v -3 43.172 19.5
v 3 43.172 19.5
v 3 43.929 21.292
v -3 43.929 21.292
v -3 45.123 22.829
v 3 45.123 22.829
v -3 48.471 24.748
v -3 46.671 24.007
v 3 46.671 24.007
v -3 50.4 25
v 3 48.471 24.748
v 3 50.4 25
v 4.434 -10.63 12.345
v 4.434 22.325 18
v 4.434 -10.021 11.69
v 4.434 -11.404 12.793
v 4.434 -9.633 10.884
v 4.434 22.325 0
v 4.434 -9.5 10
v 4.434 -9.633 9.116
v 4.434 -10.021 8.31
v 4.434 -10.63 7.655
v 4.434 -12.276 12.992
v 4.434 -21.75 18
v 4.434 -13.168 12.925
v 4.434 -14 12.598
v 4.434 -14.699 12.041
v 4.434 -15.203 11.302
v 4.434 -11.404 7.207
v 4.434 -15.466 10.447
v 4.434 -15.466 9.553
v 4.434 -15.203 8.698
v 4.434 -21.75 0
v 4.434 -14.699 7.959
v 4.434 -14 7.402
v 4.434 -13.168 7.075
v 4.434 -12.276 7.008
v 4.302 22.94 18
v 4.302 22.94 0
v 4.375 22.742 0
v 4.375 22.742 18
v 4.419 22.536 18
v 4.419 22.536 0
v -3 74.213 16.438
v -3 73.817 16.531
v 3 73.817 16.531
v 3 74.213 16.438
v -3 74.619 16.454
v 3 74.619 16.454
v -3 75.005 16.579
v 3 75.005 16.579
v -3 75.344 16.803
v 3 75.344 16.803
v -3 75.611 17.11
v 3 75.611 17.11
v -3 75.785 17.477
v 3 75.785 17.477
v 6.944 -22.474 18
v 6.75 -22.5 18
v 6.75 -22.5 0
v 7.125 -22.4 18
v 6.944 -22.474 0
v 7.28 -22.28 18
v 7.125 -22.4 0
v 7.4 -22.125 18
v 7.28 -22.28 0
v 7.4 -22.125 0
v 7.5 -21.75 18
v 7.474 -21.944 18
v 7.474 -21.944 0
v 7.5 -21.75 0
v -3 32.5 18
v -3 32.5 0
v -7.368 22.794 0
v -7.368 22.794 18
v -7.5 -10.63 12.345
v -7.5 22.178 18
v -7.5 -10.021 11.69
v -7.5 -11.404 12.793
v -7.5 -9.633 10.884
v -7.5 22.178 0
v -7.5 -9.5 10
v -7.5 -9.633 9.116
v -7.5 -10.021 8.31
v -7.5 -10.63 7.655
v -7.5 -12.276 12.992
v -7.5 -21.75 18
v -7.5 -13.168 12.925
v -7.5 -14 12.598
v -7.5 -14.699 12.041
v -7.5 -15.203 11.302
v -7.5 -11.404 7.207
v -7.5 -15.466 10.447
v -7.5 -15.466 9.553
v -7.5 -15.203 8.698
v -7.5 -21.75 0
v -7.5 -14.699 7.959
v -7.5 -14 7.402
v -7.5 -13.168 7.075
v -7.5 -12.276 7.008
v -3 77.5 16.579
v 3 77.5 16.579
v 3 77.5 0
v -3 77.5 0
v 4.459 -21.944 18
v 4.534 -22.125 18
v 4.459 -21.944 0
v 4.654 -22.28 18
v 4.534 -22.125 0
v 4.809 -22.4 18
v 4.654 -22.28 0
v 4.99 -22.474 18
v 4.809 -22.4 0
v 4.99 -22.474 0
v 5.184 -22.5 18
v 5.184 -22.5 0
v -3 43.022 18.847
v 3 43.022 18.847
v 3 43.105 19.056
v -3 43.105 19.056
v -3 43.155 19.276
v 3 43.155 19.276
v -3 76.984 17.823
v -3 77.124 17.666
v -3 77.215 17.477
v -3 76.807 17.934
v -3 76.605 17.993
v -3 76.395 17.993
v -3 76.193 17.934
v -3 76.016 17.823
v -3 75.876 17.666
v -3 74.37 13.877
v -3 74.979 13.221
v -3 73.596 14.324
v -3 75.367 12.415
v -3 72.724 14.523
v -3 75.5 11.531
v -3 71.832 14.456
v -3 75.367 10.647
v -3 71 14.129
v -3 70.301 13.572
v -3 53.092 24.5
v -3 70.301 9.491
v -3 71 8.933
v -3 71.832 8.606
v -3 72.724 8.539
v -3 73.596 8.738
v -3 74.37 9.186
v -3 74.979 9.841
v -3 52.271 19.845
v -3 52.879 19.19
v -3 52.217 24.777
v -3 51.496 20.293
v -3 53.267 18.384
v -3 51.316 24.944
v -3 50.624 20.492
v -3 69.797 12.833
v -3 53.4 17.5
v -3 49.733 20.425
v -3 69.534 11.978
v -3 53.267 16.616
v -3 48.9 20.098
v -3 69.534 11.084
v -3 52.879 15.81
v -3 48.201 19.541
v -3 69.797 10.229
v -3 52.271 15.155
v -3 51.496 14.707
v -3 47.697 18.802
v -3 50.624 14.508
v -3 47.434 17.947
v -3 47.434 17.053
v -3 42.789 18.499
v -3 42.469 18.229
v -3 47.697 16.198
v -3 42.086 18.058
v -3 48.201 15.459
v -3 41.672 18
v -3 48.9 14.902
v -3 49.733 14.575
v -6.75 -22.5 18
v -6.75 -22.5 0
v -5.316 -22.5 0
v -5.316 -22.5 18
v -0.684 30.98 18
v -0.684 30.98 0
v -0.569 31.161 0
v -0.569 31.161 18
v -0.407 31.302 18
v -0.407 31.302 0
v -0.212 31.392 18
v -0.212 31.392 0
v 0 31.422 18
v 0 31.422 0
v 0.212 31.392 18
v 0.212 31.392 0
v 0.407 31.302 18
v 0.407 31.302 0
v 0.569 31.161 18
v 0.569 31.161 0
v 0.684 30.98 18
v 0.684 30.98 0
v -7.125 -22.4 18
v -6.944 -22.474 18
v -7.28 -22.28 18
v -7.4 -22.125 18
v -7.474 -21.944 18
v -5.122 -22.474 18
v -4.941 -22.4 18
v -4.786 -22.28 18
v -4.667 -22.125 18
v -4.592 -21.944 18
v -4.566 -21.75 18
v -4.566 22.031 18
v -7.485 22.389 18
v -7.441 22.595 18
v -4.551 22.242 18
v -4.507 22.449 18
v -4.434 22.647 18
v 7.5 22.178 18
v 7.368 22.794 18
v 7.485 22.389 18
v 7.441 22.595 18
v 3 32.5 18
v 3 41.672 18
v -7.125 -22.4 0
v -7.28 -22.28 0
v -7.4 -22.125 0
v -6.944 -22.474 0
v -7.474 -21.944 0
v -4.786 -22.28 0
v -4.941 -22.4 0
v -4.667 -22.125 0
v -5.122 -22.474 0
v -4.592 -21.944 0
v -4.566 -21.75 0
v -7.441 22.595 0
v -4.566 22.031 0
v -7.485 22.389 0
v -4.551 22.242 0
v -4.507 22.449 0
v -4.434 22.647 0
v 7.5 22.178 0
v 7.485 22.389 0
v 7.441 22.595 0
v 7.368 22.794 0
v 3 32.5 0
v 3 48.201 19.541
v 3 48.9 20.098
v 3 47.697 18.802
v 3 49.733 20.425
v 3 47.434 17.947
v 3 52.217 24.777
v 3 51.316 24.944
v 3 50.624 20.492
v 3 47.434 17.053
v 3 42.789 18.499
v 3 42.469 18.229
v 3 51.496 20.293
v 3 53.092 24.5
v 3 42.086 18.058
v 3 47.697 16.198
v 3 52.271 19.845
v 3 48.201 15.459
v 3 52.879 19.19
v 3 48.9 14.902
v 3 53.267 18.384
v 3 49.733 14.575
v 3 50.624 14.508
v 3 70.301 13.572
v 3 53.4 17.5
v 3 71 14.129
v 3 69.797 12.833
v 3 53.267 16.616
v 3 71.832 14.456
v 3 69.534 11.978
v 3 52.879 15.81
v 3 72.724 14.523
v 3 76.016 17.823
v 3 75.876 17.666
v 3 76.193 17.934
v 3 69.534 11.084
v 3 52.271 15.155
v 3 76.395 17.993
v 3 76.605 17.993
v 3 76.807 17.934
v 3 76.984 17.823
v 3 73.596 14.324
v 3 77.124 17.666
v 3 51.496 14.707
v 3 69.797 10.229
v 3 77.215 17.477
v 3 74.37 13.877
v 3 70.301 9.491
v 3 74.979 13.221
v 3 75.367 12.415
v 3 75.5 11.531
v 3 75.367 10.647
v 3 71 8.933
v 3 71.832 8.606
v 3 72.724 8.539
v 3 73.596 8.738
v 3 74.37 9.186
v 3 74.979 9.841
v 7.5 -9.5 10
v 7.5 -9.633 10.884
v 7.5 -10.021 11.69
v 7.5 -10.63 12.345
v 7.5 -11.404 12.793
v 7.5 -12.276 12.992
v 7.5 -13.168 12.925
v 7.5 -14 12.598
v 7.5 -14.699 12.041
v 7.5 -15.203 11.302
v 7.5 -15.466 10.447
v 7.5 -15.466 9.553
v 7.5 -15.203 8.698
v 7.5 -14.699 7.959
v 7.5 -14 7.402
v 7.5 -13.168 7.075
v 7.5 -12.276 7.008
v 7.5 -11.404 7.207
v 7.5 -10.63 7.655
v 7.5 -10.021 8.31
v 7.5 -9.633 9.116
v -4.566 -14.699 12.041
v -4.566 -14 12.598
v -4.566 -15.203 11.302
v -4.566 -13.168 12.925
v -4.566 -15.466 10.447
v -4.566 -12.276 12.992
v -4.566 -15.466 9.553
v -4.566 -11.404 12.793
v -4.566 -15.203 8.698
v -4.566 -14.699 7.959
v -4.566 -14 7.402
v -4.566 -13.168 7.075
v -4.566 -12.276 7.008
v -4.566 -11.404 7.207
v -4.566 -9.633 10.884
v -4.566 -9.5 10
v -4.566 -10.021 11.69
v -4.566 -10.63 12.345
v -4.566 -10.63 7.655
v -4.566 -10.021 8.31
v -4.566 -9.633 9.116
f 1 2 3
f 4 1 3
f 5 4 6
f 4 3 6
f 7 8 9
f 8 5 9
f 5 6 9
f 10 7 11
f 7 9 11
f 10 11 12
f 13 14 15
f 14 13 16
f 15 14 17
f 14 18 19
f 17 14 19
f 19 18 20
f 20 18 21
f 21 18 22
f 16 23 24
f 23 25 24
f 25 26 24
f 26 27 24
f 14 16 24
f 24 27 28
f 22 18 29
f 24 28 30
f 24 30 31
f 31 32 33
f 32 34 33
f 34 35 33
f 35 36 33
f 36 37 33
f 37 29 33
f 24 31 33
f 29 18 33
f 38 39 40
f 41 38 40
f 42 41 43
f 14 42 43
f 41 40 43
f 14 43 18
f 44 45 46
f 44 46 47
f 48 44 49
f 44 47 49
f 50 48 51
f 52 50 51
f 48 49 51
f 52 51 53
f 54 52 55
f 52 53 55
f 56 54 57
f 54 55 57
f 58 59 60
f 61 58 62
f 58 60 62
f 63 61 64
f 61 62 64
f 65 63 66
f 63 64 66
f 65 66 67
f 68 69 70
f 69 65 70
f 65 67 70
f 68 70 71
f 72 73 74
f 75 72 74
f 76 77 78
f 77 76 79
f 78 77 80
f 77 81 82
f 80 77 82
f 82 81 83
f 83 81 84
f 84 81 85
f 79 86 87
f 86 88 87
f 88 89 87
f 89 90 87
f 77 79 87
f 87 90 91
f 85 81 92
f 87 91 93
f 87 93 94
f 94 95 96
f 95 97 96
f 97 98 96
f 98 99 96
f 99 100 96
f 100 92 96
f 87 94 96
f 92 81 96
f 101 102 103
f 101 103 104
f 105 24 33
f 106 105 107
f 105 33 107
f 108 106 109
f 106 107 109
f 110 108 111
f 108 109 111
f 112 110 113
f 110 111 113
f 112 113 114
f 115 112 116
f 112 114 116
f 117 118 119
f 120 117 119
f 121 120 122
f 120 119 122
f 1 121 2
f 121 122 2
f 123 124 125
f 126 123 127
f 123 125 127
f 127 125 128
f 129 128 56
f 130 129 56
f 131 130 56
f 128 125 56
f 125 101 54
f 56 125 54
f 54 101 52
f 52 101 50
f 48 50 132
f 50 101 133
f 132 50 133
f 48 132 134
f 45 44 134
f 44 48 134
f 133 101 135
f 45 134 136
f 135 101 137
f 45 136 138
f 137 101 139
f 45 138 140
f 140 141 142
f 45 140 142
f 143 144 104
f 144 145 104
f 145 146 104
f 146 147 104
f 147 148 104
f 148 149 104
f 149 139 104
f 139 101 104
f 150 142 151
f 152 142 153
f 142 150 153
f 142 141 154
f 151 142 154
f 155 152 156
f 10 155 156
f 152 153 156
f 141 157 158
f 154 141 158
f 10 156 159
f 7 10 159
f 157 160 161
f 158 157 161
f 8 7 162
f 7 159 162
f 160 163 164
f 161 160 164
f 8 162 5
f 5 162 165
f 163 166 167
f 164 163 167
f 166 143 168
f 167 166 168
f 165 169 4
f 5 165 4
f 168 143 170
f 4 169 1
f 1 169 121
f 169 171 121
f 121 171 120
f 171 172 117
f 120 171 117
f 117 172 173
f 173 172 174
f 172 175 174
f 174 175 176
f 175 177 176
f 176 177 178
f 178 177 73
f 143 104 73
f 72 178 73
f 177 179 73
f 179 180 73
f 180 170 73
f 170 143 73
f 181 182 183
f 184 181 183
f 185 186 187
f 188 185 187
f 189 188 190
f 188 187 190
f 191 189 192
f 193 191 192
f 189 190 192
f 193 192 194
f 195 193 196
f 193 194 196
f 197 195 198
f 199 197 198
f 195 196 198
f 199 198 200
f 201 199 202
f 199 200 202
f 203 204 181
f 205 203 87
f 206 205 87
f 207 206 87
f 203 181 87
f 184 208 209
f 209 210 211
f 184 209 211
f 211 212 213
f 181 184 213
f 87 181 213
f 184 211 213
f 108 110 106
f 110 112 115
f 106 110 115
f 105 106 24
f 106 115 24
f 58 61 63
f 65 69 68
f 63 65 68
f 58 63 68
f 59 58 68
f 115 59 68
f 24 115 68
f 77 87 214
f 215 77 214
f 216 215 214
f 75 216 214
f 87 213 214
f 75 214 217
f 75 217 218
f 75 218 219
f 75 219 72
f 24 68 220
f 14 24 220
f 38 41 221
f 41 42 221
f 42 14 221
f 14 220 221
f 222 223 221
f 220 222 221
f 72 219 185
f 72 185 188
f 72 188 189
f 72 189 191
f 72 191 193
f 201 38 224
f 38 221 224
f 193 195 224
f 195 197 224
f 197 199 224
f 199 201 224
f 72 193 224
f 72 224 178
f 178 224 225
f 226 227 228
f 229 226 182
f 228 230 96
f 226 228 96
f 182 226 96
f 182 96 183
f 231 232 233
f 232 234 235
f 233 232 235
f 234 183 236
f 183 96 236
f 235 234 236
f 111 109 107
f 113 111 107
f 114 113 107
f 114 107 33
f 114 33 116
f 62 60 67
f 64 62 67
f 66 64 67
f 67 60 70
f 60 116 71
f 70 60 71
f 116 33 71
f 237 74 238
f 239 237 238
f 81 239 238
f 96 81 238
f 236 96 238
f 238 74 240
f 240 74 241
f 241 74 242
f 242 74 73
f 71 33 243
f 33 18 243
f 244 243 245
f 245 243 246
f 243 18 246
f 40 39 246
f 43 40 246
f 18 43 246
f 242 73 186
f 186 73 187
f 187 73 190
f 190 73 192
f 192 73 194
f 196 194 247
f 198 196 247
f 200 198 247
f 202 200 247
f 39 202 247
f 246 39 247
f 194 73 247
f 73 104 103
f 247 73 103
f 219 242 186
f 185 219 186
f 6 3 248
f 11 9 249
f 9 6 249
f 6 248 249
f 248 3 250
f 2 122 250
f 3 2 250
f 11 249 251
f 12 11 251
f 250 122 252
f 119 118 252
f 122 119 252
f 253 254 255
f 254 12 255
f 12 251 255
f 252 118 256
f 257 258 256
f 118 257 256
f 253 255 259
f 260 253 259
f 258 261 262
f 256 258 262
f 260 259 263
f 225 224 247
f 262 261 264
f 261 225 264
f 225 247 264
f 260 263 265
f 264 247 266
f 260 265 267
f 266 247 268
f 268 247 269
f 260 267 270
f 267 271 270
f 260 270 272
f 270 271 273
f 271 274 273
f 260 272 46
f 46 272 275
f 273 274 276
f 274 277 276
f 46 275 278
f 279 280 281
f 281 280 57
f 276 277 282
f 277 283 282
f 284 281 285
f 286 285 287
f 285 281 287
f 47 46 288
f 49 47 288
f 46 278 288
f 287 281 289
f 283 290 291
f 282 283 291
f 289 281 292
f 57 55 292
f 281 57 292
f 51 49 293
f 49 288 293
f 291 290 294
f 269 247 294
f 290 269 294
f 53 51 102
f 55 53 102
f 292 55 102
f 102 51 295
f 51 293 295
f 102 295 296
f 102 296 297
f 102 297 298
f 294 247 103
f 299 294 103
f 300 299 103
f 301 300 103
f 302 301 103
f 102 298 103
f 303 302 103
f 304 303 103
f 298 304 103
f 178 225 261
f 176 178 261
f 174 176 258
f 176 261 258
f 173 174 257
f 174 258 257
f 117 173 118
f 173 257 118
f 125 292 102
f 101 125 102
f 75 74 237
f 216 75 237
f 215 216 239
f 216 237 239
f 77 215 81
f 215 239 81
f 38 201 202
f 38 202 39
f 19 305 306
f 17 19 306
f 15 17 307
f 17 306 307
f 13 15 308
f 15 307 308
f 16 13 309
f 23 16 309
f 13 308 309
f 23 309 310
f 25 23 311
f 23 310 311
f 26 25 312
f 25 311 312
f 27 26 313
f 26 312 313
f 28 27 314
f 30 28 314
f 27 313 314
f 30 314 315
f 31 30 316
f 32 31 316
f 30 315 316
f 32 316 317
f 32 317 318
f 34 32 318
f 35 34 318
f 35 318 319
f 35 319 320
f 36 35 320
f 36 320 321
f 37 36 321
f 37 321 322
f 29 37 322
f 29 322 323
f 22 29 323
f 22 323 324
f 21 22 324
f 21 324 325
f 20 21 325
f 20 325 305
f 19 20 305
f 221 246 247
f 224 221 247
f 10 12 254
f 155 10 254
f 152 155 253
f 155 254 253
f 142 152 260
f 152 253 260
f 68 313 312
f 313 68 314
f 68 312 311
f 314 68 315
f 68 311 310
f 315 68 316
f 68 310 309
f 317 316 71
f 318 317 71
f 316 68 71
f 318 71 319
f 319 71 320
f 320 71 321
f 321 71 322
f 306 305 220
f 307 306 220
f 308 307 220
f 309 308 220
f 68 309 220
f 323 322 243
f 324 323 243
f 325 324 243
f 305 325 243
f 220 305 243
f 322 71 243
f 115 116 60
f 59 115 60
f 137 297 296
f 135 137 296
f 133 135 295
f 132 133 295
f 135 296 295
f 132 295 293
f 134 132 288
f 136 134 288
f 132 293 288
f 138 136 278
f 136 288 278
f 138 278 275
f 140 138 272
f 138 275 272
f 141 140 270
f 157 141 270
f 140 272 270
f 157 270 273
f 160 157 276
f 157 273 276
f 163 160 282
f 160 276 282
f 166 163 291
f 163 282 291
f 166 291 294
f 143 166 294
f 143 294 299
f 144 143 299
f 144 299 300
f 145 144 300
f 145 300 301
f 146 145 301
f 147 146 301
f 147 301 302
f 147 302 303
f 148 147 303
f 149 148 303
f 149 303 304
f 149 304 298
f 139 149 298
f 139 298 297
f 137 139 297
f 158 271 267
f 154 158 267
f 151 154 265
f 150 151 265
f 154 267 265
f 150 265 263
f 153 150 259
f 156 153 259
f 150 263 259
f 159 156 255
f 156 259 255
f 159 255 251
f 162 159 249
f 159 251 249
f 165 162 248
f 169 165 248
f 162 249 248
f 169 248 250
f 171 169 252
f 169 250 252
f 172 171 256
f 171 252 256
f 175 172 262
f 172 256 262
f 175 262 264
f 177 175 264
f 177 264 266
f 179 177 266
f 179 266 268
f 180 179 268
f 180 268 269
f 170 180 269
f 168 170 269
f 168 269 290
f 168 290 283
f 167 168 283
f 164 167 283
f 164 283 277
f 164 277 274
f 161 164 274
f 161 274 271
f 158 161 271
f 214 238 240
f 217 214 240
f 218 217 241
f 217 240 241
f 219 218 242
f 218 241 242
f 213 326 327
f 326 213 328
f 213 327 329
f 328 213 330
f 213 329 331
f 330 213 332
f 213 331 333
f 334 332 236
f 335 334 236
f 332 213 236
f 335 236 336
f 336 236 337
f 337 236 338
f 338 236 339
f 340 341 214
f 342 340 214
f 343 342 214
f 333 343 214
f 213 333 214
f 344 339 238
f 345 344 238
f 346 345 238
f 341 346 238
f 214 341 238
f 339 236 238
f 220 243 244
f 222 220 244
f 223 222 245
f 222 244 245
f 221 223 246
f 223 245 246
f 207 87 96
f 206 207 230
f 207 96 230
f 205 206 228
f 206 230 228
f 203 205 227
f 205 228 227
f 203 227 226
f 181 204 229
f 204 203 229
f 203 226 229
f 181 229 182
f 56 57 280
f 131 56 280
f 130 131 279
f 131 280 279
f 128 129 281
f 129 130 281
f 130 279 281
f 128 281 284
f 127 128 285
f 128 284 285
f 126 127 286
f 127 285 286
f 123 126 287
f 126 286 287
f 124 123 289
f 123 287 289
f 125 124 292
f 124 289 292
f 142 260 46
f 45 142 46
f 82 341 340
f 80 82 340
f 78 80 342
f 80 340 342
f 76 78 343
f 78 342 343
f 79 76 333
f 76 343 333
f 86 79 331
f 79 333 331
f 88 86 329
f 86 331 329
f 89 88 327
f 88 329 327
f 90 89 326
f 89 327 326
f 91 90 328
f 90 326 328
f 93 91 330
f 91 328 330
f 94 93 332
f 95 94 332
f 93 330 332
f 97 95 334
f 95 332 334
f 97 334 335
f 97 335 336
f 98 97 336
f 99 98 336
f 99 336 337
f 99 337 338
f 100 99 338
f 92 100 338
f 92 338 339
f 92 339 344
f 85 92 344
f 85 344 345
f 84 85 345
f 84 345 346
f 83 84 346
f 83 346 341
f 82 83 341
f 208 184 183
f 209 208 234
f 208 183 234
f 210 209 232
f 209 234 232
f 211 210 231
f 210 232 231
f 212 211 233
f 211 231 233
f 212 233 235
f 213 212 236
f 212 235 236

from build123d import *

# Parameters (mm, degrees)
F1_DEPTH = 25
F2_R     = 3
F3_DEPTH = 15


with BuildPart() as f1:
    # F0 (on Top) → F1 (new body)
    with BuildSketch(Plane.XY):
        with BuildLine():
            Line((5.183941, -22.5), (6.75, -22.5))
            ThreePointArc((6.75, -22.5), (7.28033, -22.28033), (7.5, -21.75))
            Line((7.5, -21.75), (7.5, 22.178048))
            ThreePointArc((7.5, 22.178048), (7.466599, 22.492831), (7.367882, 22.793595))
            Line((7.367882, 22.793595), (3, 32.5))
            Line((3, 32.5), (3, 77.5))
            Line((3, 77.5), (-3, 77.5))
            Line((-3, 77.5), (-3, 32.5))
            Line((-3, 32.5), (-7.367882, 22.793595))
            ThreePointArc((-7.367882, 22.793595), (-7.466599, 22.492831), (-7.5, 22.178048))
            Line((-7.5, 22.178048), (-7.5, -21.75))
            ThreePointArc((-7.5, -21.75), (-7.28033, -22.28033), (-6.75, -22.5))
            Line((-6.75, -22.5), (-5.316059, -22.5))
            ThreePointArc((-5.316059, -22.5), (-4.785729, -22.28033), (-4.566059, -21.75))
            Line((-4.566059, -21.75), (-4.566059, 22.03125))
            ThreePointArc((-4.566059, 22.03125), (-4.532658, 22.346033), (-4.433941, 22.646797))
            Line((-4.433941, 22.646797), (-0.683941, 30.980131))
            ThreePointArc((-0.683941, 30.980131), (0, 31.422357), (0.683941, 30.980131))
            Line((0.683941, 30.980131), (4.301823, 22.940392))
            ThreePointArc((4.301823, 22.940392), (4.40054, 22.639628), (4.433941, 22.324845))
            Line((4.433941, 22.324845), (4.433941, -21.75))
            ThreePointArc((4.433941, -21.75), (4.653611, -22.28033), (5.183941, -22.5))
        make_face()
    extrude(amount=F1_DEPTH)

    # F2 (on face) → F3 (cut)
    with BuildSketch(Plane.YZ.offset(7.5)):
        with BuildLine():
            Line((77.5, 25), (50.400115, 25))
            ThreePointArc((50.400115, 25), (51.768982, 24.874022), (53.091863, 24.500321))
            Line((53.091863, 24.500321), (73.81722, 16.531051))
            ThreePointArc((73.81722, 16.531051), (75.005426, 16.579196), (75.78519, 17.477038))
            ThreePointArc((75.78519, 17.477038), (76.5, 18), (77.21481, 17.477038))
            Line((77.21481, 17.477038), (77.5, 16.579144))
            Line((77.5, 16.579144), (77.5, 25))
        make_face()
        with BuildLine():
            Line((-21.75, 25), (-21.828302, 25))
            Line((-21.828302, 25), (-23.686077, 25))
            Line((-23.686077, 25), (-23.686077, 18))
            Line((-23.686077, 18), (-21.828302, 18))
            Line((-21.828302, 18), (41.671698, 18))
            ThreePointArc((41.671698, 18), (42.468668, 18.229237), (43.022045, 18.846881))
            ThreePointArc((43.022045, 18.846881), (43.089574, 19.175113), (43.171698, 19.5))
            ThreePointArc((43.171698, 19.5), (45.858639, 23.468668), (50.400115, 25))
            Line((50.400115, 25), (43.171698, 25))
            Line((43.171698, 25), (-21.75, 25))
        make_face()
        with BuildLine():
            ThreePointArc((43.022045, 18.846881), (43.133806, 19.164977), (43.171698, 19.5))
            ThreePointArc((43.171698, 19.5), (43.089574, 19.175113), (43.022045, 18.846881))
        make_face()
        with Locations((50.400115, 17.5)):
            Circle(F2_R)
        with Locations((-12.5, 10)):
            Circle(F2_R)
        with Locations((72.5, 11.531051)):
            Circle(F2_R)
    extrude(amount=-F3_DEPTH, mode=Mode.SUBTRACT)


solid = f1.part
